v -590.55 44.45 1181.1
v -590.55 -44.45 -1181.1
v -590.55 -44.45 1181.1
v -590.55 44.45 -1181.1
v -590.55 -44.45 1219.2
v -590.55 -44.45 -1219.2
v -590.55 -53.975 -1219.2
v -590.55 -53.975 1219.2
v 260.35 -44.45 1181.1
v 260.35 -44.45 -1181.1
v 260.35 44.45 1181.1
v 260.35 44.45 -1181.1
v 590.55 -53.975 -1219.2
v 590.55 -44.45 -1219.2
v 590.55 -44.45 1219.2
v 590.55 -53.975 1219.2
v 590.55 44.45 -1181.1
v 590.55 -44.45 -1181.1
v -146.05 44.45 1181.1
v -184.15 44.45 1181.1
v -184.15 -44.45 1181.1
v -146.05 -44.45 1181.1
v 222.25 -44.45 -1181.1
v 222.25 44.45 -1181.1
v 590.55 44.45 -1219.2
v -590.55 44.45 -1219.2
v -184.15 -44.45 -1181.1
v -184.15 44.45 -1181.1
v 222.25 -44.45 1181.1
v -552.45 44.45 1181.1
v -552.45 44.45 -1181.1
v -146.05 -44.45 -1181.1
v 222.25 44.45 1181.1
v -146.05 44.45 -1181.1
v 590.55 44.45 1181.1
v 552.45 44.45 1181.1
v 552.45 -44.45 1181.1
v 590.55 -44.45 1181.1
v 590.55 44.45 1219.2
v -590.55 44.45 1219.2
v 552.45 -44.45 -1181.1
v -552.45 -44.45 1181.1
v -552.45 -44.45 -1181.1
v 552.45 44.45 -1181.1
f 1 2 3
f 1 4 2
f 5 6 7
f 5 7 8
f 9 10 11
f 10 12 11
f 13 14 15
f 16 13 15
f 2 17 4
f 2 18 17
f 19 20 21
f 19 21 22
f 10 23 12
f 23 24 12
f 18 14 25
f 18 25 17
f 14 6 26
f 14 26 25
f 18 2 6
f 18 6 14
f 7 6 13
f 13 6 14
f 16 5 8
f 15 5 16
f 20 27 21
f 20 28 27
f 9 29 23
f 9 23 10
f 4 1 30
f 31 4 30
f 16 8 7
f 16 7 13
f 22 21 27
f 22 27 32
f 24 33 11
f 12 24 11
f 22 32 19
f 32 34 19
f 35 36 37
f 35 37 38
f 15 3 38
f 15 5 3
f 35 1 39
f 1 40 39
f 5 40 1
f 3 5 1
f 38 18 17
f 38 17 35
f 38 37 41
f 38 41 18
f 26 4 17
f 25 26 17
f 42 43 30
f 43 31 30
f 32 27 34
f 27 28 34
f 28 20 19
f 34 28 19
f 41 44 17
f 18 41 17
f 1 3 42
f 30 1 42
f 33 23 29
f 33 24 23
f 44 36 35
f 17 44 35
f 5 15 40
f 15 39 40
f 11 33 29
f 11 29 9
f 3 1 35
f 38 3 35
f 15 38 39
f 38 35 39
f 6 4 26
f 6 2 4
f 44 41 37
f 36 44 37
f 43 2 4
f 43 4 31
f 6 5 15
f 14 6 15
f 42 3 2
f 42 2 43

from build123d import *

# Parameters (mm, degrees)
F1_DEPTH = 44.45
F0_W     = 38.1
F0_H     = 2362.2
F2_DEPTH = 44.45
F3_W     = 1181.1
F3_H     = 2438.4
F4_DEPTH = 9.525


with BuildPart() as f1:
    # F0 (on Front) → F1 (new body, symmetric)
    with BuildSketch(Plane.XZ):
        Polygon((-590.55, 1181.1), (-552.45, 1181.1), (-184.15, 1181.1), (-146.05, 1181.1), (0, 1181.1), (38.1, 1181.1), (222.25, 1181.1), (260.35, 1181.1), (552.45, 1181.1), (590.55, 1181.1), (590.55, 1219.2), (-590.55, 1219.2), align=None)
        Polygon((-184.15, -1181.1), (-552.45, -1181.1), (-590.55, -1181.1), (-590.55, -1219.2), (590.55, -1219.2), (590.55, -1181.1), (552.45, -1181.1), (260.35, -1181.1), (222.25, -1181.1), (38.1, -1181.1), (0, -1181.1), (-146.05, -1181.1), align=None)
    extrude(amount=F1_DEPTH, both=True)


with BuildPart() as f2:
    # F0 (on Front) → F2 (new body, symmetric)
    with BuildSketch(Plane.XZ):
        with Locations((-571.5, 0)):
            Rectangle(F0_W, F0_H)
        with Locations((-165.1, 0)):
            Rectangle(F0_W, F0_H)
        with Locations((241.3, 0)):
            Rectangle(F0_W, F0_H)
        with Locations((571.5, 0)):
            Rectangle(F0_W, F0_H)
    extrude(amount=F2_DEPTH, both=True)


with BuildPart() as f4:
    # F3 (on face) → F4 (new body)
    with BuildSketch(Plane.XZ.offset(44.45)):
        Rectangle(F3_W, F3_H)
    extrude(amount=F4_DEPTH)


solid = Compound([f1.part, f2.part, f4.part])
